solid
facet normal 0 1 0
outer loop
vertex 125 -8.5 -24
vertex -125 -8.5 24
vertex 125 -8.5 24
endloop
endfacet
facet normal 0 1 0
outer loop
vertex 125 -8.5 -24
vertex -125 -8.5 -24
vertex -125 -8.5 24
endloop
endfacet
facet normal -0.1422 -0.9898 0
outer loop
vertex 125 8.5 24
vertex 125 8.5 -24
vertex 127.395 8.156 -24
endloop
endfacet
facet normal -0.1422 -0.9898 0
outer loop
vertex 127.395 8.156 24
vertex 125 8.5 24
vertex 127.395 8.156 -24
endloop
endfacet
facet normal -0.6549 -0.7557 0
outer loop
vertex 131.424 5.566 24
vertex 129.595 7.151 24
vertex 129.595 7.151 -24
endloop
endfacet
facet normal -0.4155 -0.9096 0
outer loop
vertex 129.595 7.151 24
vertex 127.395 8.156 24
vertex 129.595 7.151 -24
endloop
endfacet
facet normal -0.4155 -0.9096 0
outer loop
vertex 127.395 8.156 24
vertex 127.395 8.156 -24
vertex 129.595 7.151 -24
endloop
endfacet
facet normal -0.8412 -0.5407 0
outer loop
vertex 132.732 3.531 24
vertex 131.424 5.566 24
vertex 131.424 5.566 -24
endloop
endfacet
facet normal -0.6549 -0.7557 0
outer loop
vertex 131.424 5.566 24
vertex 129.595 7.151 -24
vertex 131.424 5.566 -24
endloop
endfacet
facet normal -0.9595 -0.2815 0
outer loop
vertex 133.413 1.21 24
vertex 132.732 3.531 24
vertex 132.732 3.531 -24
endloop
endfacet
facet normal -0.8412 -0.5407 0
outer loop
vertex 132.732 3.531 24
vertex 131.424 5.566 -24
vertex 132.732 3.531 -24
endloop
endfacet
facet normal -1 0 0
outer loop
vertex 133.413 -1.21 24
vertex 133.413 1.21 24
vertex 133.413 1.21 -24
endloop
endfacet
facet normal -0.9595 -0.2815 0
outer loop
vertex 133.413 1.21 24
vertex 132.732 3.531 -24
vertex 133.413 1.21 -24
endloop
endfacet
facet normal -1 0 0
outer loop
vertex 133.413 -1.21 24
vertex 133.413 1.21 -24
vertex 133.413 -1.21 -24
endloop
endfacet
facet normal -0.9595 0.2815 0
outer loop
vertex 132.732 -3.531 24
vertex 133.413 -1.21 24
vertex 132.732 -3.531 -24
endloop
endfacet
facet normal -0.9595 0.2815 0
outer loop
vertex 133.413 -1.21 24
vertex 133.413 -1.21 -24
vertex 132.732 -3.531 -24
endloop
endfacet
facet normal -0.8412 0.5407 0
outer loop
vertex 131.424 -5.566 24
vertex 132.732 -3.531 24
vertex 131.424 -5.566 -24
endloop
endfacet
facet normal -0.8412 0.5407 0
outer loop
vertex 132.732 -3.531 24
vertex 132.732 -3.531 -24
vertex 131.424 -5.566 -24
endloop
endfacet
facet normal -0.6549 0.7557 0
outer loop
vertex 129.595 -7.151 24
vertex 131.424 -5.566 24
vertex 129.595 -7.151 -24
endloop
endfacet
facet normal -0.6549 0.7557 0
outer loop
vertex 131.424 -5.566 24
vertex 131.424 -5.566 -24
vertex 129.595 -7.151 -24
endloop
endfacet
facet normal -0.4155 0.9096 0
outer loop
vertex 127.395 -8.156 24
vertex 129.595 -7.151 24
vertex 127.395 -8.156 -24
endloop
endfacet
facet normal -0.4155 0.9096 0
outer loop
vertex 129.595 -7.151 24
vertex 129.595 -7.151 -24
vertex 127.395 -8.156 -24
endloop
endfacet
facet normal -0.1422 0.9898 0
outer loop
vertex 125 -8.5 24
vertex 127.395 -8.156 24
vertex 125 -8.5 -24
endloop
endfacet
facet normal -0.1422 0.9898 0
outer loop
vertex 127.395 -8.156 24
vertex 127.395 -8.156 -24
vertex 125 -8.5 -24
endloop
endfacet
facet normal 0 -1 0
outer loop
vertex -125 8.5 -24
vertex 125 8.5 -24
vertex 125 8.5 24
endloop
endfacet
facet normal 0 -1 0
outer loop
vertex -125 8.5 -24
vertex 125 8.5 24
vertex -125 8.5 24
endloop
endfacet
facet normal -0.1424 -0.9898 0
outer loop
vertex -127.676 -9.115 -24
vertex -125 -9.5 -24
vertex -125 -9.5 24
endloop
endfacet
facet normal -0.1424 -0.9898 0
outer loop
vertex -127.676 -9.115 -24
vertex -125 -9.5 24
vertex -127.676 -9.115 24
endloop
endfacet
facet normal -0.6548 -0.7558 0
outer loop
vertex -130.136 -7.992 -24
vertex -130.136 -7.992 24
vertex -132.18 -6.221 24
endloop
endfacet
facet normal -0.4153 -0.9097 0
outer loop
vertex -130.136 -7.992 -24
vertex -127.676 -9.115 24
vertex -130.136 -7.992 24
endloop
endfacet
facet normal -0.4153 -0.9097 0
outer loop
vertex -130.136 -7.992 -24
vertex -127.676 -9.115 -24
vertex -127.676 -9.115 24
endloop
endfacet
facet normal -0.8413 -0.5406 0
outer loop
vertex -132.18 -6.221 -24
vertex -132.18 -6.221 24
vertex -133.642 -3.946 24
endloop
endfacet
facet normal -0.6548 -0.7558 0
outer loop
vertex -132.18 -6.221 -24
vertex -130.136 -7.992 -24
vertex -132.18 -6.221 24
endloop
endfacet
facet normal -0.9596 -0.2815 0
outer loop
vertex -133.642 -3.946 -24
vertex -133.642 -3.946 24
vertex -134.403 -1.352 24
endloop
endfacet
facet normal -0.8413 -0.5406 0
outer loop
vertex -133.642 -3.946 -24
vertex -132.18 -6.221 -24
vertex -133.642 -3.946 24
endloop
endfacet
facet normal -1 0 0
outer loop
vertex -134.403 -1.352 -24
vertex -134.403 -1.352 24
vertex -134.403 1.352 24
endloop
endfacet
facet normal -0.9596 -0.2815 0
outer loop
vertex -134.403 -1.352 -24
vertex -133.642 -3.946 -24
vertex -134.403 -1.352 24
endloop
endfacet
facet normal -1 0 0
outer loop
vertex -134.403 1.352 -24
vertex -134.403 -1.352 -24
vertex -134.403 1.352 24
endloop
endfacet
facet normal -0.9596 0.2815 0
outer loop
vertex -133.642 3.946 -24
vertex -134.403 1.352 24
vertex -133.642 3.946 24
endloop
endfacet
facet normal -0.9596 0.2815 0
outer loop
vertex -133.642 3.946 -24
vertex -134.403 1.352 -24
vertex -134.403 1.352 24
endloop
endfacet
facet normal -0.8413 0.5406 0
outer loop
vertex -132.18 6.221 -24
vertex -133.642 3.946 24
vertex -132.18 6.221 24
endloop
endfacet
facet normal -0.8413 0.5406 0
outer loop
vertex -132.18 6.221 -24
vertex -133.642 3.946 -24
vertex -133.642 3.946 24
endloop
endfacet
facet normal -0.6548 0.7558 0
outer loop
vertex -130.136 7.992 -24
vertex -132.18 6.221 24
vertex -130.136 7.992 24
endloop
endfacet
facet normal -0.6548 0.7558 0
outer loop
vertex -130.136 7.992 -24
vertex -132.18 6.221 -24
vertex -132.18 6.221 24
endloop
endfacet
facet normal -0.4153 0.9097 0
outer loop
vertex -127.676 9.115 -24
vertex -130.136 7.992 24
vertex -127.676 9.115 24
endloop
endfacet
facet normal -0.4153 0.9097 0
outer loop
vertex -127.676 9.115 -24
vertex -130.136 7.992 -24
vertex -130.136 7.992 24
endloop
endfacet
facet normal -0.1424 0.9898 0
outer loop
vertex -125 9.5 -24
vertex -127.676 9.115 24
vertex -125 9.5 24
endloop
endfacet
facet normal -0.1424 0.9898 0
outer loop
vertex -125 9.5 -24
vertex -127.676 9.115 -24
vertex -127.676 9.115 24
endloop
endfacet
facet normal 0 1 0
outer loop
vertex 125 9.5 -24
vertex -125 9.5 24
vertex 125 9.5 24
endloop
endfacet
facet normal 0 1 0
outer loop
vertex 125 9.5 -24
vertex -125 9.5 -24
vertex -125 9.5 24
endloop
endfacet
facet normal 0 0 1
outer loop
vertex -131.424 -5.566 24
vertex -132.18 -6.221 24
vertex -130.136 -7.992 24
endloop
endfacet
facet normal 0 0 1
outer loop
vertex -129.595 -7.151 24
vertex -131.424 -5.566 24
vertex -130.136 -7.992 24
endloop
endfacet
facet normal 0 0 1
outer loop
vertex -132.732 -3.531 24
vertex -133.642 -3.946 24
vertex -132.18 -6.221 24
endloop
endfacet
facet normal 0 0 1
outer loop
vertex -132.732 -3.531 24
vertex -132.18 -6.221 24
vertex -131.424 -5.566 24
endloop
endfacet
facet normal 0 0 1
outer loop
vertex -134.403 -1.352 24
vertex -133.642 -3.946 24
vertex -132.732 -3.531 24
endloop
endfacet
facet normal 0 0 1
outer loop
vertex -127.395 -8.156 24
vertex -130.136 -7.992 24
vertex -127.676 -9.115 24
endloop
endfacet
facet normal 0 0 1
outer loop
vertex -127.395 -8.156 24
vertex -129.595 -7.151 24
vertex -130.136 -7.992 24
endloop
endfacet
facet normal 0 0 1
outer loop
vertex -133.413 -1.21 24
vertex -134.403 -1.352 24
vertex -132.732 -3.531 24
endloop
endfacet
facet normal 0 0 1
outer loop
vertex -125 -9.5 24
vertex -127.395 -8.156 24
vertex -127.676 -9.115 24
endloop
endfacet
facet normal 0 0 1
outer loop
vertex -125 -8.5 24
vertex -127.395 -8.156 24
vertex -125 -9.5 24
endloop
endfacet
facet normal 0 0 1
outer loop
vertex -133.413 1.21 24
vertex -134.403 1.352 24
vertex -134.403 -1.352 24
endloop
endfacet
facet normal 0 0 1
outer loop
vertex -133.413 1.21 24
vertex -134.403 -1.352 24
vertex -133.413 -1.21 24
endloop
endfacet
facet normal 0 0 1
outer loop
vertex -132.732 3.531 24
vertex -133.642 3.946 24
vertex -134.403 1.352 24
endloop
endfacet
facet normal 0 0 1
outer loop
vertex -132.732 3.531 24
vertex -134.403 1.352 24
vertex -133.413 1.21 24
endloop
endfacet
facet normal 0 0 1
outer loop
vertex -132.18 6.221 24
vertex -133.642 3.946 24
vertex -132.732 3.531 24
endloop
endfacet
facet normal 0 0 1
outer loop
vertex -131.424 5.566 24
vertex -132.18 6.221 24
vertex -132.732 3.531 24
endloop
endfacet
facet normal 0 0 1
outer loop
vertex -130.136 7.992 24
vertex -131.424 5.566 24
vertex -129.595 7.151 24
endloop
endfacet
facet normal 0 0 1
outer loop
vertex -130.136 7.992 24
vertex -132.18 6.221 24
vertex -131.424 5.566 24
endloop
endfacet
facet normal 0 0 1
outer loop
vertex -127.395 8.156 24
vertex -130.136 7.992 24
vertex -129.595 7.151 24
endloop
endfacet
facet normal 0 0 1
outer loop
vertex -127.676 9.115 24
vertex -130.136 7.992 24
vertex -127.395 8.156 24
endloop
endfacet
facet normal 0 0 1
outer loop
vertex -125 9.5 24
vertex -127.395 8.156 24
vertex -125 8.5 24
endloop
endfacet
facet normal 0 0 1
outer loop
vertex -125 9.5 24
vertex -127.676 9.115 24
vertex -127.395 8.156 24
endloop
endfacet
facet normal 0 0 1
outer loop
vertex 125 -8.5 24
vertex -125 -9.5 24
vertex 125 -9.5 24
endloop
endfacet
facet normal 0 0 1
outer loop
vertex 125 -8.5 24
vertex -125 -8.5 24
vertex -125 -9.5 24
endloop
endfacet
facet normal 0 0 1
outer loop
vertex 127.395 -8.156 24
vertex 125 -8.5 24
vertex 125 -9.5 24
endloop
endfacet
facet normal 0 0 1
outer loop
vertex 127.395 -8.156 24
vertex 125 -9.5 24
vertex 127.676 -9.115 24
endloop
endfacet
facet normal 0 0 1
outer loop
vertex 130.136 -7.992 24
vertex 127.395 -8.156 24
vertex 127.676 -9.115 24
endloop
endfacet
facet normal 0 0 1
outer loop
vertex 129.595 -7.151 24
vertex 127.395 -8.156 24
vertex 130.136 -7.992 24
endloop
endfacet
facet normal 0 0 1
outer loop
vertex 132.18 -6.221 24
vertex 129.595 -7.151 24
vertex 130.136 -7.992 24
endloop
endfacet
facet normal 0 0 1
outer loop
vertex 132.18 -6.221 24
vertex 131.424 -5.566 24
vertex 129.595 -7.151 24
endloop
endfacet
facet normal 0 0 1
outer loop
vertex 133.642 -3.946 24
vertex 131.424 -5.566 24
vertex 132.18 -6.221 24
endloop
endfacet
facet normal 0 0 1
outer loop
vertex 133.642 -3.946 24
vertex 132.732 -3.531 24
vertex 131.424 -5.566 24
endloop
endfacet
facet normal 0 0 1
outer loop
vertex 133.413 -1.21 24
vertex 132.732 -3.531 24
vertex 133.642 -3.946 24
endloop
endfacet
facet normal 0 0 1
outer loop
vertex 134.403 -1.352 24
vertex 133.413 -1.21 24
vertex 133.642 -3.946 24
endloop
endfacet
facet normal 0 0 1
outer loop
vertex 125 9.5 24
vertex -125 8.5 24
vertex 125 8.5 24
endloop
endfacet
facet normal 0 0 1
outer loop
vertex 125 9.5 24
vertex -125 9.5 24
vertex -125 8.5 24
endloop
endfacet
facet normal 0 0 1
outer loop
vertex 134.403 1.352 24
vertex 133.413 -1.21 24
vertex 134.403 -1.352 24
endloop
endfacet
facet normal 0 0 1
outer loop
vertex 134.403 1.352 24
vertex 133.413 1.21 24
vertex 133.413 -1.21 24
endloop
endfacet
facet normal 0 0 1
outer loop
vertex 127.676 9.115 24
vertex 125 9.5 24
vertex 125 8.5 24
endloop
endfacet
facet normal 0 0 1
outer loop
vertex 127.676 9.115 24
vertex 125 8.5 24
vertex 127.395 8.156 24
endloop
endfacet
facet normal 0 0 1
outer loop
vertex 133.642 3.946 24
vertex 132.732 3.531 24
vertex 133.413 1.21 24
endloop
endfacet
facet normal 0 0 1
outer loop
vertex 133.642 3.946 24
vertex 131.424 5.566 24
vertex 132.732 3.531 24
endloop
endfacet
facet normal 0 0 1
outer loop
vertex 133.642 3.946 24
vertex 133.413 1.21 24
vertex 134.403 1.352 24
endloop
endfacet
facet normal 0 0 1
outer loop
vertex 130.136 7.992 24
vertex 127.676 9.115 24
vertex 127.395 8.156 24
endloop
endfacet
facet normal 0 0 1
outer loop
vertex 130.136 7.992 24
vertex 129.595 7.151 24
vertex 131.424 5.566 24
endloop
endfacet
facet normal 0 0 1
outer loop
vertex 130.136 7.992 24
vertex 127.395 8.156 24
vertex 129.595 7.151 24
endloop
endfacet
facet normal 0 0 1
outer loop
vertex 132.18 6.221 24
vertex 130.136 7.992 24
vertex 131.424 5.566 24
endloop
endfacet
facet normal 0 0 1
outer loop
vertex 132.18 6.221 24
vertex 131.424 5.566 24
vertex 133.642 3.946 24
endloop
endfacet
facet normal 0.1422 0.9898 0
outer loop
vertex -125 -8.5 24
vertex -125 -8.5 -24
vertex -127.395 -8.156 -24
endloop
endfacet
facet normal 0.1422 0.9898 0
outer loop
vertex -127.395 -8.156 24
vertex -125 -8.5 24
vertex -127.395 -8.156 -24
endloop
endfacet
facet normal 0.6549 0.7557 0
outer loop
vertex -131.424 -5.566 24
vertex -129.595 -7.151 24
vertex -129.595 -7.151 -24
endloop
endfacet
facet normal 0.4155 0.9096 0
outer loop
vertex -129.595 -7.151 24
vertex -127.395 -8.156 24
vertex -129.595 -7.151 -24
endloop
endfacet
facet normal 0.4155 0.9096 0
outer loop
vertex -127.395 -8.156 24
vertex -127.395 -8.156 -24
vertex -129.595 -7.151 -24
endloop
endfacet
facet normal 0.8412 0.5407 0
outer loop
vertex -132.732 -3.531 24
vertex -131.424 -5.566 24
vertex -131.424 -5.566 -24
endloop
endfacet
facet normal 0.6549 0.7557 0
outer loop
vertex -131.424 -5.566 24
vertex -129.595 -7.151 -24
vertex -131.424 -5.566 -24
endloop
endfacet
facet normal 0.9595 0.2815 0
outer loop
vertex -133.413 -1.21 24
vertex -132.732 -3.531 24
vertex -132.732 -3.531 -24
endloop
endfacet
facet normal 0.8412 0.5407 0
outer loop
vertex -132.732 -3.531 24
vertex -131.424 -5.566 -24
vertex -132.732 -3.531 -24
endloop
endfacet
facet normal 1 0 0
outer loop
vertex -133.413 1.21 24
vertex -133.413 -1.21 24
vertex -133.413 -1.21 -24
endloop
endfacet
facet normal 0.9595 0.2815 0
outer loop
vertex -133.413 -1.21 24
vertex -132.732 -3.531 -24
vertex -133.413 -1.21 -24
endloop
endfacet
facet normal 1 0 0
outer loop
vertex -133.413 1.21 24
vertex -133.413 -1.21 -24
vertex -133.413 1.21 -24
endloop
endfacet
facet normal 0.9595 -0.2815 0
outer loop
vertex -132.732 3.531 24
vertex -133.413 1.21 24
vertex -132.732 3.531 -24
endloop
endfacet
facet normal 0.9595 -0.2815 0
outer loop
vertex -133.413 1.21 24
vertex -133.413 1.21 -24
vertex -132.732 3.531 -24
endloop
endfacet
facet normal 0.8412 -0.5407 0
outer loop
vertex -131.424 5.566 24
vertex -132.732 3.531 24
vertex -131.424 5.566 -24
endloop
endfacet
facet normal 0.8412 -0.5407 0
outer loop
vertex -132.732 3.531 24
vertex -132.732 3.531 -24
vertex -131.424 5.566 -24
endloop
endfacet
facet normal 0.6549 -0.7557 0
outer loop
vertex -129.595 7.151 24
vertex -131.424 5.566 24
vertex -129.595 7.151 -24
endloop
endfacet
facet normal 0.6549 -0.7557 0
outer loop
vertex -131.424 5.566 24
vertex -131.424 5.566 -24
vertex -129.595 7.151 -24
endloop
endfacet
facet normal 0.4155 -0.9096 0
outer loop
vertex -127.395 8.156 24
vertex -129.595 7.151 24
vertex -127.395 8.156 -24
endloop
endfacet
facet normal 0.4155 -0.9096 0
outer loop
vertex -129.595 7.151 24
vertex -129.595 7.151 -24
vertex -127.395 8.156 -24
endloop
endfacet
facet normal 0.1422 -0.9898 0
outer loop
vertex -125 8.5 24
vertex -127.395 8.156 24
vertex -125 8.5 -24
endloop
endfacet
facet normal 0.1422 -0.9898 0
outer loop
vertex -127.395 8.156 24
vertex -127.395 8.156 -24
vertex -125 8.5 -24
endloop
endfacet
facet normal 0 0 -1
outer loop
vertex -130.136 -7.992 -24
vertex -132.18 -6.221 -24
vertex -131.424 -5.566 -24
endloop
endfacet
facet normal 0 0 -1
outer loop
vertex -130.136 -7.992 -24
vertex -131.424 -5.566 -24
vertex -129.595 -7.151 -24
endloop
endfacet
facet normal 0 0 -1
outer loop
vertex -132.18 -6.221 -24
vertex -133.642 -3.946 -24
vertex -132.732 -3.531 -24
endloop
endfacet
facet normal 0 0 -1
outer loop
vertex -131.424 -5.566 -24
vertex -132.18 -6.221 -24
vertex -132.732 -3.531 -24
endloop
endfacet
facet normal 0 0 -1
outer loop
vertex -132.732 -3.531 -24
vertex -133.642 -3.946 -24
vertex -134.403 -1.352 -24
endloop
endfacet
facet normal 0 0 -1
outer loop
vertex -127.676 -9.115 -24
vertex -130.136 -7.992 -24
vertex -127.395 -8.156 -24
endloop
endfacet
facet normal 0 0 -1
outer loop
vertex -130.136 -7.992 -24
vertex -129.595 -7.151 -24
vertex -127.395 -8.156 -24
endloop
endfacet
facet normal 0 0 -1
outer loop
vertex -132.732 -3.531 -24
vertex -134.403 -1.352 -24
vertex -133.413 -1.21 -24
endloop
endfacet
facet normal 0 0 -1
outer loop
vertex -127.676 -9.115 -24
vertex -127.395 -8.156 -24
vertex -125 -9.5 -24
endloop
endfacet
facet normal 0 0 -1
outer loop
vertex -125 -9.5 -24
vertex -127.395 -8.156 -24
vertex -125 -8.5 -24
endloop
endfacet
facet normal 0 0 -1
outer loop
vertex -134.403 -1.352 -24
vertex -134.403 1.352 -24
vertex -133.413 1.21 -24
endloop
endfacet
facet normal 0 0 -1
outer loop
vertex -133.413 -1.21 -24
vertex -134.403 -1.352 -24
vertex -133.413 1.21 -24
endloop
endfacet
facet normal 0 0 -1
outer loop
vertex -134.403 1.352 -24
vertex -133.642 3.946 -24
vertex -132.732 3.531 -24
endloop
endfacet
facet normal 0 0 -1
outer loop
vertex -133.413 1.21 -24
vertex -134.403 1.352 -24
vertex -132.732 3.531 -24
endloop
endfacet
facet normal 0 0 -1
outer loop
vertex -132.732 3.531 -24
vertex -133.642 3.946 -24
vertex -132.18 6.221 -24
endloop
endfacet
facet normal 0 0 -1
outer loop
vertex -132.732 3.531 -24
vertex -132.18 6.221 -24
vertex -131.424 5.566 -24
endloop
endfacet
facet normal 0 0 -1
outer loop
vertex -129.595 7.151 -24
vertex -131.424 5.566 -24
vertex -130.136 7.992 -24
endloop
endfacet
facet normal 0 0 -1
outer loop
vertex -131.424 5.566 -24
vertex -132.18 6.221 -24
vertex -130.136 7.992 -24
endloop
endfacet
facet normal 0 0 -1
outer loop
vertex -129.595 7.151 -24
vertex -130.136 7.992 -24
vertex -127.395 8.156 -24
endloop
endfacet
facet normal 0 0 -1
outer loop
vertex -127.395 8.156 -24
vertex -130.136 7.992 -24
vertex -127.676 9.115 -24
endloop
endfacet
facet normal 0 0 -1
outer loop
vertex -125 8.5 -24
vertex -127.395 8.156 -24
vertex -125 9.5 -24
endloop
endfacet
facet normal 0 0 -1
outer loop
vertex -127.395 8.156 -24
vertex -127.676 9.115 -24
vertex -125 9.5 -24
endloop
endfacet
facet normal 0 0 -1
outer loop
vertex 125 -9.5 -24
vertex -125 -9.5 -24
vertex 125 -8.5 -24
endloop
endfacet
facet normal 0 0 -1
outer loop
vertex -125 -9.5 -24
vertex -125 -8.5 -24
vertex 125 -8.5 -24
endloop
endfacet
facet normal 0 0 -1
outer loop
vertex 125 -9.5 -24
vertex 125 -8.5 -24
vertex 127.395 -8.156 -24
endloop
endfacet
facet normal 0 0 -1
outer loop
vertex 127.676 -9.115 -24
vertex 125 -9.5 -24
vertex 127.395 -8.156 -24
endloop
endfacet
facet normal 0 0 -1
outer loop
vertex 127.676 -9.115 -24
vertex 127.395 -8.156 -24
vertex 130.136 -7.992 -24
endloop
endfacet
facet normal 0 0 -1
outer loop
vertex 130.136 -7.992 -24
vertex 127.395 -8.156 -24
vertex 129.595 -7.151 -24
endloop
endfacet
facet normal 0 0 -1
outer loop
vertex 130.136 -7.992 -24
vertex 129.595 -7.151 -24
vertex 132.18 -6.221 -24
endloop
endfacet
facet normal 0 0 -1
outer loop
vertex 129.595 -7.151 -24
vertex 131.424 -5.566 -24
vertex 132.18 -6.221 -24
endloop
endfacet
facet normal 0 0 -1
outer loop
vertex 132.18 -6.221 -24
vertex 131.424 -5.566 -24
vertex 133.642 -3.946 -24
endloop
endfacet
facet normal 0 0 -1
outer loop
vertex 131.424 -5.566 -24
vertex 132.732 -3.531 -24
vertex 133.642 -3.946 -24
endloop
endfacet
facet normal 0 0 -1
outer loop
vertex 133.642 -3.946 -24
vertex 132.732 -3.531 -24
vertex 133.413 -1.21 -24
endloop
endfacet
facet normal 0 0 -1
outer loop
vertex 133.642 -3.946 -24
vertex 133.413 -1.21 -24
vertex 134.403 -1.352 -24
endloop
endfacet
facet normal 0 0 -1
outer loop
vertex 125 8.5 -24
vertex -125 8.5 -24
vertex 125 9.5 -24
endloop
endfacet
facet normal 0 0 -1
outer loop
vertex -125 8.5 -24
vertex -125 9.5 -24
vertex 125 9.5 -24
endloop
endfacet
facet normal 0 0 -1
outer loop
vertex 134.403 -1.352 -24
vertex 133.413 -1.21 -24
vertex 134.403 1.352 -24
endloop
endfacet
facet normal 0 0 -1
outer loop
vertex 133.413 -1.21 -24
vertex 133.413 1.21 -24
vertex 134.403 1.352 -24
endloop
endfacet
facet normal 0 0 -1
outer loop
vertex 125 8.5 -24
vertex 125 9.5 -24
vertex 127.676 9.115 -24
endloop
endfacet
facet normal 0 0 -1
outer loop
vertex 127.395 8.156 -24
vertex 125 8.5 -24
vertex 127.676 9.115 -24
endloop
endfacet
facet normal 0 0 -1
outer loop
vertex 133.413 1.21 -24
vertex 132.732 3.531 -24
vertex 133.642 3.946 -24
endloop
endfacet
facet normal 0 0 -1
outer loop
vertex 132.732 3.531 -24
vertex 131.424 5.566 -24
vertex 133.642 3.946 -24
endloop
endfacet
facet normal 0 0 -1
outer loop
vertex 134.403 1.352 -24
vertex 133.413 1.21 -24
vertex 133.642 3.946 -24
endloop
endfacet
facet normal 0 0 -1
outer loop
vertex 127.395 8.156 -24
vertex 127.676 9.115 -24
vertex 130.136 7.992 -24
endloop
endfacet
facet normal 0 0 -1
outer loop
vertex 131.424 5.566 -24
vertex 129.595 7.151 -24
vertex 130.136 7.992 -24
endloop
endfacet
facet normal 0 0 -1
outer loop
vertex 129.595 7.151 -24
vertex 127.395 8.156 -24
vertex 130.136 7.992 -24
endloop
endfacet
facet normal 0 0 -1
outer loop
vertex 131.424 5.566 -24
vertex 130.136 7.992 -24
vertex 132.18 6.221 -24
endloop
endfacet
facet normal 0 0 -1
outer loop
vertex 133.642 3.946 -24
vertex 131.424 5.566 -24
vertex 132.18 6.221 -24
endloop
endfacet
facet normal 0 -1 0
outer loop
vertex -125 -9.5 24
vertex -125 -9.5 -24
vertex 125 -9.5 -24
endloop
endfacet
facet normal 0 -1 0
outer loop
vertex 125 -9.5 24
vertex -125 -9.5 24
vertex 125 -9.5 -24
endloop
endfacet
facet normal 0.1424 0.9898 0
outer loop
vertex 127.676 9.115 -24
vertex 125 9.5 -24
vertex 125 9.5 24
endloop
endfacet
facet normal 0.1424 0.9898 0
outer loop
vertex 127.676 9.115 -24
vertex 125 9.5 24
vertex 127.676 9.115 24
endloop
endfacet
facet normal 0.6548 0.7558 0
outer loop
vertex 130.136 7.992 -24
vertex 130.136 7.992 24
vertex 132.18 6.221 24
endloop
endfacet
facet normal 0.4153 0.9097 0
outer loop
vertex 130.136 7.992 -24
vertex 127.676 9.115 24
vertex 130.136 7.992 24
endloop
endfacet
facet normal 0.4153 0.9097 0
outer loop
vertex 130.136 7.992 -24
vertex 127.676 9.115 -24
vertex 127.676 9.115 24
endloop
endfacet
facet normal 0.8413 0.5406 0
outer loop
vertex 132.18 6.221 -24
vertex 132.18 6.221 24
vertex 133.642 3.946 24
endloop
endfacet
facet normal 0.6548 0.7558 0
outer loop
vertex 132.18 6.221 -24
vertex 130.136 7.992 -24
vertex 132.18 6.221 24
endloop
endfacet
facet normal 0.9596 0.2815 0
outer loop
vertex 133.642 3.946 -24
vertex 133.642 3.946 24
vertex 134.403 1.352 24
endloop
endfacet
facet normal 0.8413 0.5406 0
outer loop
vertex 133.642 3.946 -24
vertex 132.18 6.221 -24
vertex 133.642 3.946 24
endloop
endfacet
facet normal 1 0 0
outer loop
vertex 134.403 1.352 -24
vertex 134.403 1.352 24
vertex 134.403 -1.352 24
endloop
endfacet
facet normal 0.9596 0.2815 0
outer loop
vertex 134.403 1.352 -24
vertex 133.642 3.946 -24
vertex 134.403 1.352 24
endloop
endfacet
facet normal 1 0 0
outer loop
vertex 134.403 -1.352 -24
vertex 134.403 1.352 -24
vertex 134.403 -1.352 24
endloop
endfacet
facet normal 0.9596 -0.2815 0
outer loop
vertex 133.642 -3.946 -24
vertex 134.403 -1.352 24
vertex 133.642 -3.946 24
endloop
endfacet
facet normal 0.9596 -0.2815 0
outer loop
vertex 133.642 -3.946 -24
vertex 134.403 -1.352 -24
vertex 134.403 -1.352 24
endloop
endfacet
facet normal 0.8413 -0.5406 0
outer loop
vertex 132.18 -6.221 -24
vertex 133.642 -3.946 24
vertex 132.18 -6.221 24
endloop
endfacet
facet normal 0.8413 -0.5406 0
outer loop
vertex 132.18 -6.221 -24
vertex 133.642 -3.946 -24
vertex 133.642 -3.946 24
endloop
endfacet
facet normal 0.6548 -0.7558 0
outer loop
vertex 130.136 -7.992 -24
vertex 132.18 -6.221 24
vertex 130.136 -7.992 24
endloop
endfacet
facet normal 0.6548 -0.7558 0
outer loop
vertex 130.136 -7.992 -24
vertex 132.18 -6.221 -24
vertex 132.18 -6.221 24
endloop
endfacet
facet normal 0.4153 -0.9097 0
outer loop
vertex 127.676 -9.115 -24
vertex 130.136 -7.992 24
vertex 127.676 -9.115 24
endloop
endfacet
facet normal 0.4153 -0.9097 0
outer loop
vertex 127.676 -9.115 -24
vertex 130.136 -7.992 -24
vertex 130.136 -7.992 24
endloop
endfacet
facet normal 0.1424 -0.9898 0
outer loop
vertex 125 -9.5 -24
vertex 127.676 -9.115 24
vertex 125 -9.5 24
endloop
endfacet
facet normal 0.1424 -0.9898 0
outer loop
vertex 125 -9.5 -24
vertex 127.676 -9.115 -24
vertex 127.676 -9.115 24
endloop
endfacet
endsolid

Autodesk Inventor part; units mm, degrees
ref_plane "YZ Plane" through (0, 0, 0) normal (1, 0, 0) x (0, 1, 0)
ref_plane "XZ Plane" through (0, 0, 0) normal (0, 1, 0) x (-1, 0, 0)
ref_plane "XY Plane" through (0, 0, 0) normal (0, 0, 1) x (1, 0, 0)
sketch "Sketch1" plane through (0, 0, 0) normal (0, 0, 1) x (1, 0, 0)
  line L0 (-125, 9.5) -> (125, 9.5)
  circle A0 centre (125, 0) radius 9.5 construction
  arc A1 (125, -9.5) -> (125, 9.5) centre (125, 0) ccw
  line L1 (-125, -9.5) -> (125, -9.5)
  arc A2 (-125, 9.5) -> (-125, -9.5) centre (-125, 0) ccw
  line L2 (125, 8.5) -> (-125, 8.5)
  arc A3 (-125, 8.5) -> (-125, -8.5) centre (-125, 0) ccw
  line L3 (-125, -8.5) -> (125, -8.5)
  arc A4 (125, -8.5) -> (125, 8.5) centre (125, 0) ccw
  point P0 (0, 0)
  point P1 (0, 9.5)
  dimension "d0" = 250
  dimension "d3" = 1
  dimension "d8" = 8.5
  dimension "d9" = 17
extrude "Extrusion1" add sketch "Sketch1" along normal mid plane 48
properties part number "Conveyor_003_001" material "Rubber"
